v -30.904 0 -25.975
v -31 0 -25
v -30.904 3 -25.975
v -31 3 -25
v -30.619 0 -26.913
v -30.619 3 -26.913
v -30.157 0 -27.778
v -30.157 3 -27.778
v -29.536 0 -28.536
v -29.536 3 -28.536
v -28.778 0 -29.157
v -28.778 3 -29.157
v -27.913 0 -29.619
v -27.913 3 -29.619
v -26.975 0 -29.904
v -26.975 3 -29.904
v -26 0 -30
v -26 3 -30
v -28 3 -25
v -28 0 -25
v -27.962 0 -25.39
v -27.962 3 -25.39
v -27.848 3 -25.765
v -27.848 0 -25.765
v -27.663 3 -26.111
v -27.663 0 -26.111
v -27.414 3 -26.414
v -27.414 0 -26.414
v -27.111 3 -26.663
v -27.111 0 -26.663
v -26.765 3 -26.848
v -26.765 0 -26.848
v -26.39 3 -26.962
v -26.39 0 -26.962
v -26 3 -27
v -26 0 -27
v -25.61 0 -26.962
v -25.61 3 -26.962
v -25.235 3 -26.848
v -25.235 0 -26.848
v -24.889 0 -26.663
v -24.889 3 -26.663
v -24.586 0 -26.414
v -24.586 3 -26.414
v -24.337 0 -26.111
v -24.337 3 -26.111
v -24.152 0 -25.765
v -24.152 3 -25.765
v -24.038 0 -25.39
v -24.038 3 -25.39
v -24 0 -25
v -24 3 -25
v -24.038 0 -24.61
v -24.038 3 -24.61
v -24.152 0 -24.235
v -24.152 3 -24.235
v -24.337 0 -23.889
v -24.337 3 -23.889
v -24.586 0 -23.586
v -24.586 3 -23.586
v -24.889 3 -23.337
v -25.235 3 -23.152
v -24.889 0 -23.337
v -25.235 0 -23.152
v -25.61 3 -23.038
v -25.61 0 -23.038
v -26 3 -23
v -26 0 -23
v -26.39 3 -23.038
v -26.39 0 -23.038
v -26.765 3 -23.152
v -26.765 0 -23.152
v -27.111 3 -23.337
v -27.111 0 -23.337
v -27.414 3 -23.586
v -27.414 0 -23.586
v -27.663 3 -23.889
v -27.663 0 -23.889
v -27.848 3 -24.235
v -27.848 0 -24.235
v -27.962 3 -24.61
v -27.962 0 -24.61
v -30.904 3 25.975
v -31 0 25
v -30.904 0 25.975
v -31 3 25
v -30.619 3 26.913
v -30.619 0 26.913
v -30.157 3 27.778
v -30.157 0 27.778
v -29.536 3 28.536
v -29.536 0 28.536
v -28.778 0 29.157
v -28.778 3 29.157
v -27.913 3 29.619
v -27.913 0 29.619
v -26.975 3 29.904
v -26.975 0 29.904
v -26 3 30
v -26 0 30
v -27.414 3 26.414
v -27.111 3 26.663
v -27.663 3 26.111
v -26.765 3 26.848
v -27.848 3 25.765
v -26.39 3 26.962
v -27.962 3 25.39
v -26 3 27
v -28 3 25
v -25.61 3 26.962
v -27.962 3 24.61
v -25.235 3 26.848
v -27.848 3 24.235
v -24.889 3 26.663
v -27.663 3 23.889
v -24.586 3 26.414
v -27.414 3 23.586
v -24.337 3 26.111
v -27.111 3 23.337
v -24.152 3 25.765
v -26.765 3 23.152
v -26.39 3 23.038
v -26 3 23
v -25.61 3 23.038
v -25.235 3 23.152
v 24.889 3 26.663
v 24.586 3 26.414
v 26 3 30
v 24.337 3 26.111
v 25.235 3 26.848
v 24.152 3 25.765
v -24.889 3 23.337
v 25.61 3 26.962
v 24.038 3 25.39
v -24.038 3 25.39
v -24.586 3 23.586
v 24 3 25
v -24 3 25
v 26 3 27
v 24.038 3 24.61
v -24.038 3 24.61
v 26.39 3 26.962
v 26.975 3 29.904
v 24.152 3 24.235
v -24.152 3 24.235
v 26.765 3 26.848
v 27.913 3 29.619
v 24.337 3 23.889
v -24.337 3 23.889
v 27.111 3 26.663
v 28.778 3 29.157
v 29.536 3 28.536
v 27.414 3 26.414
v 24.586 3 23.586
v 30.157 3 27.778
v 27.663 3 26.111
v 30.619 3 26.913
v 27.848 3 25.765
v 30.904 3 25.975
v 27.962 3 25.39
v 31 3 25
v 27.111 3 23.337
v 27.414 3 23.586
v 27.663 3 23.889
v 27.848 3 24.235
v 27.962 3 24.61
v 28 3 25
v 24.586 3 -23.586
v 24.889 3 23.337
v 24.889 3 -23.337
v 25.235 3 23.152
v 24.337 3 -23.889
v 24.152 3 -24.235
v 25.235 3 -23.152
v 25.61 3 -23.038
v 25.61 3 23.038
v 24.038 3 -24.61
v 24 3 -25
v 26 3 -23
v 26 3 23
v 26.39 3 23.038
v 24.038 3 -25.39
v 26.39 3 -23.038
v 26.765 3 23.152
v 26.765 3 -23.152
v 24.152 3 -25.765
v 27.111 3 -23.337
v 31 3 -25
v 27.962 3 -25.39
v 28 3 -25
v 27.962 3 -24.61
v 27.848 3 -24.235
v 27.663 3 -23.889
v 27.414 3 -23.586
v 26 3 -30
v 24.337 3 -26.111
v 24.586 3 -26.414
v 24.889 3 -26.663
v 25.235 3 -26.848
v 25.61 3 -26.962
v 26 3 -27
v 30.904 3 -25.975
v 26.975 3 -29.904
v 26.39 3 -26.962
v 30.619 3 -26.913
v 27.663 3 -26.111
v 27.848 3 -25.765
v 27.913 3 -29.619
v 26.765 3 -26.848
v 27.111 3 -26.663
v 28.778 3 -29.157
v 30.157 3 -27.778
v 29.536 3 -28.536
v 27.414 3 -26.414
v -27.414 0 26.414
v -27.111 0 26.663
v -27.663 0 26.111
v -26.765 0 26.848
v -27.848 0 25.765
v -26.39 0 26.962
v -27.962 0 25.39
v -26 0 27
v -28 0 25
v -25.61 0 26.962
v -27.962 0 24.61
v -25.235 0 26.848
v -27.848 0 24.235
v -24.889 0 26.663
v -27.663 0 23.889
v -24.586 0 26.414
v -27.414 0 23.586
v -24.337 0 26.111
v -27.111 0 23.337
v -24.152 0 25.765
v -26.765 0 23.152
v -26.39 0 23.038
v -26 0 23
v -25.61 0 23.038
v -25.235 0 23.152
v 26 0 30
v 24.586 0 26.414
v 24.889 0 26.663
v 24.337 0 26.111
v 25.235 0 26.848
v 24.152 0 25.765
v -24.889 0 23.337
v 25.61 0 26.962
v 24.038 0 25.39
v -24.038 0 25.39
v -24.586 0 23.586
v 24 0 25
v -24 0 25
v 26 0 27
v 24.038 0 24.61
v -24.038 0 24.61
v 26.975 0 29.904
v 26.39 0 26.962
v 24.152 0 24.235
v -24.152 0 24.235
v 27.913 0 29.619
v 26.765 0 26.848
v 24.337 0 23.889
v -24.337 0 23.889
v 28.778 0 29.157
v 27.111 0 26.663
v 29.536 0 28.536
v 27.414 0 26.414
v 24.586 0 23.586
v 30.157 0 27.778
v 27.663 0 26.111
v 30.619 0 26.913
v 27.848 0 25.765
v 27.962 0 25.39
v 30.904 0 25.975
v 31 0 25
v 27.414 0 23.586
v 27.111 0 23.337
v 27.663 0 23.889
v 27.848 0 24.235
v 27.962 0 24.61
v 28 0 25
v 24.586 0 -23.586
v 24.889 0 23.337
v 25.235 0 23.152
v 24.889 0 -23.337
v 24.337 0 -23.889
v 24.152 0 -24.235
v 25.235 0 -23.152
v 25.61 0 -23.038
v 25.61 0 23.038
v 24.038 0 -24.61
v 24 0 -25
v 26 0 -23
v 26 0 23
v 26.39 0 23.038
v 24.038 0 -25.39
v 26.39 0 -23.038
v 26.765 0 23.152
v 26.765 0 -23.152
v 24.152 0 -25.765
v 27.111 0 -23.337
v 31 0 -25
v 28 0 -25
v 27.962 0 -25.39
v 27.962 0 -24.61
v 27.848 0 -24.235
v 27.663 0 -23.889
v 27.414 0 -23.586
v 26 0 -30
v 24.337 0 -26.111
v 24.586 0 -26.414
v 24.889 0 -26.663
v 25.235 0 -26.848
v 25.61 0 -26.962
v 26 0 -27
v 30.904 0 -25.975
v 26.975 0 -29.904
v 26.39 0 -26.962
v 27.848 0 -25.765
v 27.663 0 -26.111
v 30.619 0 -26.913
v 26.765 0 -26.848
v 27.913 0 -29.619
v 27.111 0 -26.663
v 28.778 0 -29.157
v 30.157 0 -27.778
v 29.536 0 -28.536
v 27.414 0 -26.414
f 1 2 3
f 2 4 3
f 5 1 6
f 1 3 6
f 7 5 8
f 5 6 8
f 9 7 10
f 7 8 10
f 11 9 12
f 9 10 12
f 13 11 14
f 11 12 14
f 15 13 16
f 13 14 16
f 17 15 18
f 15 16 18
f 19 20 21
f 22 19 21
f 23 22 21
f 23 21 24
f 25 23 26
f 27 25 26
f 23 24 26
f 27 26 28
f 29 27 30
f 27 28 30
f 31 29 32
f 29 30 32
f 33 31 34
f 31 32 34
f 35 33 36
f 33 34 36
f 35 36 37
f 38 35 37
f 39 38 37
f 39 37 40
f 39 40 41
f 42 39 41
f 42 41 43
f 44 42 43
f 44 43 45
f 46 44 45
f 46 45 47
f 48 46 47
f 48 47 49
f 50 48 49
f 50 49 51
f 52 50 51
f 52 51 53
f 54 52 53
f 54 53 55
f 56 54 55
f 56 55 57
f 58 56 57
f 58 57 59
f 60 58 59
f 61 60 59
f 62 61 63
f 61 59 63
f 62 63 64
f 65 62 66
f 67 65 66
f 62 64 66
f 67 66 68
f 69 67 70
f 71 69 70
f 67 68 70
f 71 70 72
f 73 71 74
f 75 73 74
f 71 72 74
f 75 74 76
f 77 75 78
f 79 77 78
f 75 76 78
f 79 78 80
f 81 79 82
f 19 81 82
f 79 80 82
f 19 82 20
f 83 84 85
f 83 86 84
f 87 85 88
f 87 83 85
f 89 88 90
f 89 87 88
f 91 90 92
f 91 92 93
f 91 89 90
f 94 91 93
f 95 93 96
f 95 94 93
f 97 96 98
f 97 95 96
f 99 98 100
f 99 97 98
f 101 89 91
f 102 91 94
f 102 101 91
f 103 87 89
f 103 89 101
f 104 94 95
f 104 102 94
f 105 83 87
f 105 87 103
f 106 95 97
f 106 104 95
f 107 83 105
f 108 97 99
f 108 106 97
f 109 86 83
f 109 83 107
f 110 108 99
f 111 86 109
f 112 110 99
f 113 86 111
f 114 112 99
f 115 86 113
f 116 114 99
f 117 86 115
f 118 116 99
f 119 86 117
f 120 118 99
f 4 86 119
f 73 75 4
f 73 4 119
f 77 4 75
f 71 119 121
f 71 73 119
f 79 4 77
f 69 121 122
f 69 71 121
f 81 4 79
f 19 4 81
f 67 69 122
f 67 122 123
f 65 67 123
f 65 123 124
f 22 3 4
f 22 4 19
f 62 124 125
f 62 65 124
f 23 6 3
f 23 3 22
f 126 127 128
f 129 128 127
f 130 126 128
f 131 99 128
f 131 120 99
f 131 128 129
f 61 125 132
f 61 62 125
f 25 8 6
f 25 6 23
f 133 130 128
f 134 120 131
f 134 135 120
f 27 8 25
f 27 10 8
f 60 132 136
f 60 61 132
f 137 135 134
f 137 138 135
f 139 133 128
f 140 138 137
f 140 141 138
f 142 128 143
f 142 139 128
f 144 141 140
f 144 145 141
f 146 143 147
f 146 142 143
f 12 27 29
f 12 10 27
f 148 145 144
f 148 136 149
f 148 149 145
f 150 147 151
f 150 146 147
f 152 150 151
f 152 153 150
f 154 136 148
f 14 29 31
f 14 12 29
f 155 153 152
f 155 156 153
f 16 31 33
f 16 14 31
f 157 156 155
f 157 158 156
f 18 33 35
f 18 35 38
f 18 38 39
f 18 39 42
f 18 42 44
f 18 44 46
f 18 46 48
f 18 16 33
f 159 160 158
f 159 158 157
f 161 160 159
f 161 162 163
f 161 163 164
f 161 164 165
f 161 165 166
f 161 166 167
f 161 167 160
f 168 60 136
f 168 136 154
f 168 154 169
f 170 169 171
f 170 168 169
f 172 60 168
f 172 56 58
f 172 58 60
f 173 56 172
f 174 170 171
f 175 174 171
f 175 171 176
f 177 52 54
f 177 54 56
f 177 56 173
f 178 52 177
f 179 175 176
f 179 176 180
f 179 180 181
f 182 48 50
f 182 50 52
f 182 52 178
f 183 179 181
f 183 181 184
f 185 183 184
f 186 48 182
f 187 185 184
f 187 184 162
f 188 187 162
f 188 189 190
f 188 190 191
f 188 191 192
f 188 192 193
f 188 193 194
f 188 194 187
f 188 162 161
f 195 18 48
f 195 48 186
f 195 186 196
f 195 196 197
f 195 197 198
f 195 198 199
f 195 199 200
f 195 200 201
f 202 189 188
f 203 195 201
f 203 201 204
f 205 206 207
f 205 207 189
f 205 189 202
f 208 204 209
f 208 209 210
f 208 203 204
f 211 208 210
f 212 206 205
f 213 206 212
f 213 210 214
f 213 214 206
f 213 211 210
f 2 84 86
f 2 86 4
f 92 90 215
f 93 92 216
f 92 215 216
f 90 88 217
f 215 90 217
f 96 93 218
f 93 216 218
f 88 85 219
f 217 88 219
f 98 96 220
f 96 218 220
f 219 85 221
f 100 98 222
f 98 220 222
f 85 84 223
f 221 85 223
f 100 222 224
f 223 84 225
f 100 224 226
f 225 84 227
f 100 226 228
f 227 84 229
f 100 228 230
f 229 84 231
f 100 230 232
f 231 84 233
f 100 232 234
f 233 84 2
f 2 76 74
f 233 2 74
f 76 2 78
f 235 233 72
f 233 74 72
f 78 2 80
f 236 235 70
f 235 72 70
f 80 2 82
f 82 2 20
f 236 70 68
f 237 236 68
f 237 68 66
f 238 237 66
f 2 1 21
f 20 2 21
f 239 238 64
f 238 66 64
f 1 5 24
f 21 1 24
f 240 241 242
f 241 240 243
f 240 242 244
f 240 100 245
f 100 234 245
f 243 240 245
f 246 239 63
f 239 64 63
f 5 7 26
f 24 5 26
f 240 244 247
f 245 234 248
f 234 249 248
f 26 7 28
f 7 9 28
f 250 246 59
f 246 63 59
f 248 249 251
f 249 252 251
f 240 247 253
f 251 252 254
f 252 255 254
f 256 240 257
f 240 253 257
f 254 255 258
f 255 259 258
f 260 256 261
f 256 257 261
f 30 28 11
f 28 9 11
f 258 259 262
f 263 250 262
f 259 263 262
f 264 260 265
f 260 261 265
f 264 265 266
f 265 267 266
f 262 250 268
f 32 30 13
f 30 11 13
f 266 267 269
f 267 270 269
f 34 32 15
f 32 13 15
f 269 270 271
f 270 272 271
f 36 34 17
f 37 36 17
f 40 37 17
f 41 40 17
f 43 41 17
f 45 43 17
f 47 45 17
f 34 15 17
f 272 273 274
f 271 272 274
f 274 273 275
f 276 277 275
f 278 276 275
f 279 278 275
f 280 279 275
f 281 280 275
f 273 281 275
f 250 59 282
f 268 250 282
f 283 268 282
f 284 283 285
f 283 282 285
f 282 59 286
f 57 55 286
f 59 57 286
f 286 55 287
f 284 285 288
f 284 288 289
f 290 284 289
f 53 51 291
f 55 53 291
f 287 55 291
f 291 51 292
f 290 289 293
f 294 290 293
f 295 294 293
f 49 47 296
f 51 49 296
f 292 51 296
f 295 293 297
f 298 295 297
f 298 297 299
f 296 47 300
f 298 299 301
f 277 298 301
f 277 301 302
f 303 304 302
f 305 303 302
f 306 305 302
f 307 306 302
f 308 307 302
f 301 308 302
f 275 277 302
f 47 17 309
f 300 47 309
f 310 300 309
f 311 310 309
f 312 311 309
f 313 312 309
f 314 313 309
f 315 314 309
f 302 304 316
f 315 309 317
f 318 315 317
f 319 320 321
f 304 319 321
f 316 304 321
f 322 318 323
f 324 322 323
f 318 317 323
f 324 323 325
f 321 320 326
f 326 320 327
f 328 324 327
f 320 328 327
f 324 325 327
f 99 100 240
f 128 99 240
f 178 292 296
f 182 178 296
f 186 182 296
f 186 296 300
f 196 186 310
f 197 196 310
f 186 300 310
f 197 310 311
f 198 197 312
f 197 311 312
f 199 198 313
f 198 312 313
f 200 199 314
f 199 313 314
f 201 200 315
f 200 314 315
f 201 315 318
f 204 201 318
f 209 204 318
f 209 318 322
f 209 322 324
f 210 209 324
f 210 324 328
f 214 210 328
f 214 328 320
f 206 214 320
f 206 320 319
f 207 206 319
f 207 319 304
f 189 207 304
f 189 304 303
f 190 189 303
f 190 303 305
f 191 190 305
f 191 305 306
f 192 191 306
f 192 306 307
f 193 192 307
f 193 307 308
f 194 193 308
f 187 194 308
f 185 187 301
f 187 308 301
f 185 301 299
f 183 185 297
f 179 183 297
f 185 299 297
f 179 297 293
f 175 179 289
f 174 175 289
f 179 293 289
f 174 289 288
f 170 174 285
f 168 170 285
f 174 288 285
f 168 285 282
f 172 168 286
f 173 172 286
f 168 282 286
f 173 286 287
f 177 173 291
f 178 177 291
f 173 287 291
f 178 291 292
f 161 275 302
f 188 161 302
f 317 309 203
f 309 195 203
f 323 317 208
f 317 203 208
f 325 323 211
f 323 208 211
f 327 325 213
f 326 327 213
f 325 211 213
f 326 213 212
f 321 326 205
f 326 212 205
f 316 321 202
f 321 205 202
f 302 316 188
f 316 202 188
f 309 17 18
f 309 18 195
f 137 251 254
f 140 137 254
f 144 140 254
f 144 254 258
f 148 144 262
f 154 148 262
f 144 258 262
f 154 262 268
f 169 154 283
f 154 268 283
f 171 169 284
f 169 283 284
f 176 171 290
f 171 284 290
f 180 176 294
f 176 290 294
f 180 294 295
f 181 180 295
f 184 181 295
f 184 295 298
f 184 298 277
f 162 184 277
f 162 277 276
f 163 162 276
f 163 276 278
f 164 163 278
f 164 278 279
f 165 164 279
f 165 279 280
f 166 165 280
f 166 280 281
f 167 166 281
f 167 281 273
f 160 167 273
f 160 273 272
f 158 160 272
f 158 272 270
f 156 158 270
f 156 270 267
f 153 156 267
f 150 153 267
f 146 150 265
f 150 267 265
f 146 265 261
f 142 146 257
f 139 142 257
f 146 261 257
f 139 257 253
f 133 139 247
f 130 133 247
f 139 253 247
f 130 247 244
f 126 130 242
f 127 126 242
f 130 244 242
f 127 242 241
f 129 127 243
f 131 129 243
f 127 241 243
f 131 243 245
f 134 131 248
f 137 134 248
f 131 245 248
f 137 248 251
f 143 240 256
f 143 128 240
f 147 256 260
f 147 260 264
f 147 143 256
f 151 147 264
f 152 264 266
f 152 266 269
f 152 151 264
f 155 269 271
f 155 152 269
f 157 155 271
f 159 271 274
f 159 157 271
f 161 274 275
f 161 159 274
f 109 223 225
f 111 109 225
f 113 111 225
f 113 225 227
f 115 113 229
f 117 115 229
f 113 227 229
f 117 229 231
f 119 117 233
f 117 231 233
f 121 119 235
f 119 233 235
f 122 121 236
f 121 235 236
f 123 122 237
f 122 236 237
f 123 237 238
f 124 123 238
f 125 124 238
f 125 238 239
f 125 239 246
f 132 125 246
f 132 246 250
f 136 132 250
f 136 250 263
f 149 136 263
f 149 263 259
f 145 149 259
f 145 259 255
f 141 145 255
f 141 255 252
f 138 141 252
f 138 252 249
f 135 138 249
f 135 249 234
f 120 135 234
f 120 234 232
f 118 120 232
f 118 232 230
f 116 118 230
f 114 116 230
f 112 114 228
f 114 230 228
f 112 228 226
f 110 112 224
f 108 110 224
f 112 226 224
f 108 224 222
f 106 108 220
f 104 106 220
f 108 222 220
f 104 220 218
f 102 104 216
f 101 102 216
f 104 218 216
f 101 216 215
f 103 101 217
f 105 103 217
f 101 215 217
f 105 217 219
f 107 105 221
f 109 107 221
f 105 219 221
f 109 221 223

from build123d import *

# Parameters (mm, degrees)
SKETCH1_W                = 62
SKETCH1_H                = 60
BOSS_EXTRUDE1_DEPTH      = 3
F_4_0_4_DIAMETER_HOLE1_D = 4
FILLET1_R                = 5


with BuildPart() as part:
    # Sketch1 → Boss-Extrude1 (new body)
    with BuildSketch(Plane(origin=(0, 0, 0), x_dir=(1, 0, 0), z_dir=(0, 1, 0))):
        Rectangle(SKETCH1_W, SKETCH1_H)
    extrude(amount=BOSS_EXTRUDE1_DEPTH)

    # Ø4.0 (4) Diameter Hole1 (through all)
    with Locations(Plane(origin=(0, 3, 0), x_dir=(1, 0, 0), z_dir=(0, 1, 0))):
        with Locations((-26, 25), (26, -25), (26, 25), (-26, -25)):
            Hole(F_4_0_4_DIAMETER_HOLE1_D / 2)

    # Fillet1
    fillet1_edges = [part.edges().sort_by_distance(p)[0] for p in [
        (31, 1.5, 30),
        (-31, 1.5, 30),
        (-31, 1.5, -30),
        (31, 1.5, -30),
    ]]
    fillet(fillet1_edges, radius=FILLET1_R)


solid = part.part
